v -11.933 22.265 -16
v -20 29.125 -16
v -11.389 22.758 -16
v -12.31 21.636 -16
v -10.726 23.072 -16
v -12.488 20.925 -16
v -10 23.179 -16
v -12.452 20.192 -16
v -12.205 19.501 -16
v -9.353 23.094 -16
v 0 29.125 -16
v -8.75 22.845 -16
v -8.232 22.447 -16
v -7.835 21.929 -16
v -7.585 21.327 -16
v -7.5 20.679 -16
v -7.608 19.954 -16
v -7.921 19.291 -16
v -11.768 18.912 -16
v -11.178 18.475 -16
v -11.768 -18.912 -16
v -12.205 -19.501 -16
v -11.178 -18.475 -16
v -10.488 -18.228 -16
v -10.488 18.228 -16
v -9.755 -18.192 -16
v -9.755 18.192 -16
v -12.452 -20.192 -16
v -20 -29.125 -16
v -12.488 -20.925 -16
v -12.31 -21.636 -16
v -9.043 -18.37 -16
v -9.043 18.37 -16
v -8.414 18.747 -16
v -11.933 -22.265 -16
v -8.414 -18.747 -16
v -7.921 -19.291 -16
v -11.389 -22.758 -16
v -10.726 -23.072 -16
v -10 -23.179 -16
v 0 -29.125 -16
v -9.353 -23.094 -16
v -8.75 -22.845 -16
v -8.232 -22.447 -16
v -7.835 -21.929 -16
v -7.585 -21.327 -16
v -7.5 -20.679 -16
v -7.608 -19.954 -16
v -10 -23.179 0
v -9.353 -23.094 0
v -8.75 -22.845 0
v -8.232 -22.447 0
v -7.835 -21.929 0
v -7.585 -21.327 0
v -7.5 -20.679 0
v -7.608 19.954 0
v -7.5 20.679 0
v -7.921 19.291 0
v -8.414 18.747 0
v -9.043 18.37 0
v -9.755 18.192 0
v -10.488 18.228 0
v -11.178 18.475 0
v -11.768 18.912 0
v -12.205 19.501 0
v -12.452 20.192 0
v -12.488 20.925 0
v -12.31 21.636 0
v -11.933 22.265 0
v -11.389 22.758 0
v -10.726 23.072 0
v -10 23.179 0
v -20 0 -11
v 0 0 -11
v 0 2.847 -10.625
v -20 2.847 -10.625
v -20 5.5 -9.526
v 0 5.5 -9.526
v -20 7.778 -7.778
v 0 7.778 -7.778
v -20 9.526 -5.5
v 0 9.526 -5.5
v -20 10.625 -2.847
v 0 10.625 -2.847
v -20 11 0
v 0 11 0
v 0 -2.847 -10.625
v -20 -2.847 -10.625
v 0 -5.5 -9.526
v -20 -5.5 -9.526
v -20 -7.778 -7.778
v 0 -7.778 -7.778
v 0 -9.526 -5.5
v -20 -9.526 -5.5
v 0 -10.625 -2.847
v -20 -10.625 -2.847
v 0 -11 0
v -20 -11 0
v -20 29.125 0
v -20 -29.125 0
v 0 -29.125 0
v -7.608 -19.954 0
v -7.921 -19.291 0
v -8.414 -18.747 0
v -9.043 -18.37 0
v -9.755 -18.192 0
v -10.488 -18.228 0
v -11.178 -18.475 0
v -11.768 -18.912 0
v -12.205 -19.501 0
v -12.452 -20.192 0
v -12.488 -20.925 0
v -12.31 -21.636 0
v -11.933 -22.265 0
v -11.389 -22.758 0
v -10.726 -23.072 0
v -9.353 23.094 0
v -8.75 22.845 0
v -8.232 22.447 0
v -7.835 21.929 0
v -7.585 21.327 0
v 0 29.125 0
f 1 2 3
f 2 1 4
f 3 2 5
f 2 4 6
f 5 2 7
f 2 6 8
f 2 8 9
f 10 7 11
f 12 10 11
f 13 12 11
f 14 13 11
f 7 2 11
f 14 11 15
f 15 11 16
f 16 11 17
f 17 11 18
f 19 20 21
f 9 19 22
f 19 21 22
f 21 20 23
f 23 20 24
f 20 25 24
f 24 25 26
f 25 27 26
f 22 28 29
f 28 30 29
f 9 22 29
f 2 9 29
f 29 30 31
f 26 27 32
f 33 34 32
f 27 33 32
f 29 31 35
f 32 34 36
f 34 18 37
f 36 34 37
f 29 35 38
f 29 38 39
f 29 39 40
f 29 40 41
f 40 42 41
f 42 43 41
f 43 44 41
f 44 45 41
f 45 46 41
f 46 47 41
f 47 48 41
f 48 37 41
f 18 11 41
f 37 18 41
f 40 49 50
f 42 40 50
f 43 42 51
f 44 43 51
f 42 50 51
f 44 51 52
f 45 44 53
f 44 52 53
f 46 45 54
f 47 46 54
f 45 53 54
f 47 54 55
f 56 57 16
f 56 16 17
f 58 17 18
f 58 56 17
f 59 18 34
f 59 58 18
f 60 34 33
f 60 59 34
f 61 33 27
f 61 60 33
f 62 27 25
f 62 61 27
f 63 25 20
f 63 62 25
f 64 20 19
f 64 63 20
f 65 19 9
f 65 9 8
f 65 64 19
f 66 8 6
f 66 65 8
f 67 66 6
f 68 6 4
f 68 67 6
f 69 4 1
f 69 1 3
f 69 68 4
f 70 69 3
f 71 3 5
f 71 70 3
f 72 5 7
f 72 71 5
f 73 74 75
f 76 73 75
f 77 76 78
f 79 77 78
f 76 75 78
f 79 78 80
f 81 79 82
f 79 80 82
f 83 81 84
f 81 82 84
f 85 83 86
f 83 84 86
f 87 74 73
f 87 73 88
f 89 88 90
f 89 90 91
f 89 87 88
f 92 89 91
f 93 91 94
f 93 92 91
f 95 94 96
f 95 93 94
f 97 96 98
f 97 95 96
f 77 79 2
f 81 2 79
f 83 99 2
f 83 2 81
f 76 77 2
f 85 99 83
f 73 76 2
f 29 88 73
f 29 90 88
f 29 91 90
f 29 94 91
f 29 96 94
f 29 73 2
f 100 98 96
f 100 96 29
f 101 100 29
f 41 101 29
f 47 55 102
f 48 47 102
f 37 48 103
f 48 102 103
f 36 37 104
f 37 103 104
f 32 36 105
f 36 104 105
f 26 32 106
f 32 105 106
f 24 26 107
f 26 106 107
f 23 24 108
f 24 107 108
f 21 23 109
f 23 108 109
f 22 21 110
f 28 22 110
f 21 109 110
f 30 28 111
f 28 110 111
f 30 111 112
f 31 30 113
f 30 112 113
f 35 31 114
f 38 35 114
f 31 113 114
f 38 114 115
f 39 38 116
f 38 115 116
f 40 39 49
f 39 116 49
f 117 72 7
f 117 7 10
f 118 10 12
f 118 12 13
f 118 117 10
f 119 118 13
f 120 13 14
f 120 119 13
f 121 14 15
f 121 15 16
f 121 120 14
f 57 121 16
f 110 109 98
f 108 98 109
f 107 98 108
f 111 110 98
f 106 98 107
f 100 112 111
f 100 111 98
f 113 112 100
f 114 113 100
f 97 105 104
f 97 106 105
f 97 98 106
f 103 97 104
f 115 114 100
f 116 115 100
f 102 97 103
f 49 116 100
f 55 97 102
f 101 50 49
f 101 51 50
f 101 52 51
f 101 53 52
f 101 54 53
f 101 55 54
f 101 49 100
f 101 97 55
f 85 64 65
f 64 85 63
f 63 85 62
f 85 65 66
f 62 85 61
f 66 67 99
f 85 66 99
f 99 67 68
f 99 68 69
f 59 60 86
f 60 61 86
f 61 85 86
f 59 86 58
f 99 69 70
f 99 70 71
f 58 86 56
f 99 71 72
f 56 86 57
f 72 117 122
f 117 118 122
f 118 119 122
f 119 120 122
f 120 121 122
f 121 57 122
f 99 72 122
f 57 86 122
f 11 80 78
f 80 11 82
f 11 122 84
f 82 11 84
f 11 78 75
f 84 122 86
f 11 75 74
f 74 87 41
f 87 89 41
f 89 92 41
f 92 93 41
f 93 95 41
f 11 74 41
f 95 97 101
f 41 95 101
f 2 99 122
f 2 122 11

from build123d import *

# Parameters (mm, degrees)
F1_DEPTH = 20
F4_DEPTH = 25


with BuildPart() as f1:
    # F0 (on Right) → F1 (new body)
    with BuildSketch(Plane.YZ):
        with BuildLine():
            ThreePointArc((0, -11), (-7.7781745931, -7.7781745931), (-11, 0))
            Line((-11, 0), (-29.125, 0))
            Line((-29.125, 0), (-29.125, -16))
            Line((-29.125, -16), (0, -16))
            Line((0, -16), (0, -11))
        make_face()
    extrude(amount=-F1_DEPTH)

    # F3 (on offset) → F4 (cut)
    with BuildSketch(Plane.XY):
        with BuildLine():
            ThreePointArc((-10, -23.1794859892), (-8.232233047, -22.4472529422), (-7.5, -20.6794859892))
            ThreePointArc((-7.5, -20.6794859892), (-11.767766953, -18.9117190362), (-10, -23.1794859892))
        make_face()
    extrude(amount=-F4_DEPTH, mode=Mode.SUBTRACT)

    # F5: F1 across face


with BuildPart() as f1_1:
    add(f1.part)
    add(f1.part.mirror(Plane(origin=(-10, 0, -13.5), x_dir=(-1, 0, 0), z_dir=(0, 1, 0))))


solid = f1_1.part
